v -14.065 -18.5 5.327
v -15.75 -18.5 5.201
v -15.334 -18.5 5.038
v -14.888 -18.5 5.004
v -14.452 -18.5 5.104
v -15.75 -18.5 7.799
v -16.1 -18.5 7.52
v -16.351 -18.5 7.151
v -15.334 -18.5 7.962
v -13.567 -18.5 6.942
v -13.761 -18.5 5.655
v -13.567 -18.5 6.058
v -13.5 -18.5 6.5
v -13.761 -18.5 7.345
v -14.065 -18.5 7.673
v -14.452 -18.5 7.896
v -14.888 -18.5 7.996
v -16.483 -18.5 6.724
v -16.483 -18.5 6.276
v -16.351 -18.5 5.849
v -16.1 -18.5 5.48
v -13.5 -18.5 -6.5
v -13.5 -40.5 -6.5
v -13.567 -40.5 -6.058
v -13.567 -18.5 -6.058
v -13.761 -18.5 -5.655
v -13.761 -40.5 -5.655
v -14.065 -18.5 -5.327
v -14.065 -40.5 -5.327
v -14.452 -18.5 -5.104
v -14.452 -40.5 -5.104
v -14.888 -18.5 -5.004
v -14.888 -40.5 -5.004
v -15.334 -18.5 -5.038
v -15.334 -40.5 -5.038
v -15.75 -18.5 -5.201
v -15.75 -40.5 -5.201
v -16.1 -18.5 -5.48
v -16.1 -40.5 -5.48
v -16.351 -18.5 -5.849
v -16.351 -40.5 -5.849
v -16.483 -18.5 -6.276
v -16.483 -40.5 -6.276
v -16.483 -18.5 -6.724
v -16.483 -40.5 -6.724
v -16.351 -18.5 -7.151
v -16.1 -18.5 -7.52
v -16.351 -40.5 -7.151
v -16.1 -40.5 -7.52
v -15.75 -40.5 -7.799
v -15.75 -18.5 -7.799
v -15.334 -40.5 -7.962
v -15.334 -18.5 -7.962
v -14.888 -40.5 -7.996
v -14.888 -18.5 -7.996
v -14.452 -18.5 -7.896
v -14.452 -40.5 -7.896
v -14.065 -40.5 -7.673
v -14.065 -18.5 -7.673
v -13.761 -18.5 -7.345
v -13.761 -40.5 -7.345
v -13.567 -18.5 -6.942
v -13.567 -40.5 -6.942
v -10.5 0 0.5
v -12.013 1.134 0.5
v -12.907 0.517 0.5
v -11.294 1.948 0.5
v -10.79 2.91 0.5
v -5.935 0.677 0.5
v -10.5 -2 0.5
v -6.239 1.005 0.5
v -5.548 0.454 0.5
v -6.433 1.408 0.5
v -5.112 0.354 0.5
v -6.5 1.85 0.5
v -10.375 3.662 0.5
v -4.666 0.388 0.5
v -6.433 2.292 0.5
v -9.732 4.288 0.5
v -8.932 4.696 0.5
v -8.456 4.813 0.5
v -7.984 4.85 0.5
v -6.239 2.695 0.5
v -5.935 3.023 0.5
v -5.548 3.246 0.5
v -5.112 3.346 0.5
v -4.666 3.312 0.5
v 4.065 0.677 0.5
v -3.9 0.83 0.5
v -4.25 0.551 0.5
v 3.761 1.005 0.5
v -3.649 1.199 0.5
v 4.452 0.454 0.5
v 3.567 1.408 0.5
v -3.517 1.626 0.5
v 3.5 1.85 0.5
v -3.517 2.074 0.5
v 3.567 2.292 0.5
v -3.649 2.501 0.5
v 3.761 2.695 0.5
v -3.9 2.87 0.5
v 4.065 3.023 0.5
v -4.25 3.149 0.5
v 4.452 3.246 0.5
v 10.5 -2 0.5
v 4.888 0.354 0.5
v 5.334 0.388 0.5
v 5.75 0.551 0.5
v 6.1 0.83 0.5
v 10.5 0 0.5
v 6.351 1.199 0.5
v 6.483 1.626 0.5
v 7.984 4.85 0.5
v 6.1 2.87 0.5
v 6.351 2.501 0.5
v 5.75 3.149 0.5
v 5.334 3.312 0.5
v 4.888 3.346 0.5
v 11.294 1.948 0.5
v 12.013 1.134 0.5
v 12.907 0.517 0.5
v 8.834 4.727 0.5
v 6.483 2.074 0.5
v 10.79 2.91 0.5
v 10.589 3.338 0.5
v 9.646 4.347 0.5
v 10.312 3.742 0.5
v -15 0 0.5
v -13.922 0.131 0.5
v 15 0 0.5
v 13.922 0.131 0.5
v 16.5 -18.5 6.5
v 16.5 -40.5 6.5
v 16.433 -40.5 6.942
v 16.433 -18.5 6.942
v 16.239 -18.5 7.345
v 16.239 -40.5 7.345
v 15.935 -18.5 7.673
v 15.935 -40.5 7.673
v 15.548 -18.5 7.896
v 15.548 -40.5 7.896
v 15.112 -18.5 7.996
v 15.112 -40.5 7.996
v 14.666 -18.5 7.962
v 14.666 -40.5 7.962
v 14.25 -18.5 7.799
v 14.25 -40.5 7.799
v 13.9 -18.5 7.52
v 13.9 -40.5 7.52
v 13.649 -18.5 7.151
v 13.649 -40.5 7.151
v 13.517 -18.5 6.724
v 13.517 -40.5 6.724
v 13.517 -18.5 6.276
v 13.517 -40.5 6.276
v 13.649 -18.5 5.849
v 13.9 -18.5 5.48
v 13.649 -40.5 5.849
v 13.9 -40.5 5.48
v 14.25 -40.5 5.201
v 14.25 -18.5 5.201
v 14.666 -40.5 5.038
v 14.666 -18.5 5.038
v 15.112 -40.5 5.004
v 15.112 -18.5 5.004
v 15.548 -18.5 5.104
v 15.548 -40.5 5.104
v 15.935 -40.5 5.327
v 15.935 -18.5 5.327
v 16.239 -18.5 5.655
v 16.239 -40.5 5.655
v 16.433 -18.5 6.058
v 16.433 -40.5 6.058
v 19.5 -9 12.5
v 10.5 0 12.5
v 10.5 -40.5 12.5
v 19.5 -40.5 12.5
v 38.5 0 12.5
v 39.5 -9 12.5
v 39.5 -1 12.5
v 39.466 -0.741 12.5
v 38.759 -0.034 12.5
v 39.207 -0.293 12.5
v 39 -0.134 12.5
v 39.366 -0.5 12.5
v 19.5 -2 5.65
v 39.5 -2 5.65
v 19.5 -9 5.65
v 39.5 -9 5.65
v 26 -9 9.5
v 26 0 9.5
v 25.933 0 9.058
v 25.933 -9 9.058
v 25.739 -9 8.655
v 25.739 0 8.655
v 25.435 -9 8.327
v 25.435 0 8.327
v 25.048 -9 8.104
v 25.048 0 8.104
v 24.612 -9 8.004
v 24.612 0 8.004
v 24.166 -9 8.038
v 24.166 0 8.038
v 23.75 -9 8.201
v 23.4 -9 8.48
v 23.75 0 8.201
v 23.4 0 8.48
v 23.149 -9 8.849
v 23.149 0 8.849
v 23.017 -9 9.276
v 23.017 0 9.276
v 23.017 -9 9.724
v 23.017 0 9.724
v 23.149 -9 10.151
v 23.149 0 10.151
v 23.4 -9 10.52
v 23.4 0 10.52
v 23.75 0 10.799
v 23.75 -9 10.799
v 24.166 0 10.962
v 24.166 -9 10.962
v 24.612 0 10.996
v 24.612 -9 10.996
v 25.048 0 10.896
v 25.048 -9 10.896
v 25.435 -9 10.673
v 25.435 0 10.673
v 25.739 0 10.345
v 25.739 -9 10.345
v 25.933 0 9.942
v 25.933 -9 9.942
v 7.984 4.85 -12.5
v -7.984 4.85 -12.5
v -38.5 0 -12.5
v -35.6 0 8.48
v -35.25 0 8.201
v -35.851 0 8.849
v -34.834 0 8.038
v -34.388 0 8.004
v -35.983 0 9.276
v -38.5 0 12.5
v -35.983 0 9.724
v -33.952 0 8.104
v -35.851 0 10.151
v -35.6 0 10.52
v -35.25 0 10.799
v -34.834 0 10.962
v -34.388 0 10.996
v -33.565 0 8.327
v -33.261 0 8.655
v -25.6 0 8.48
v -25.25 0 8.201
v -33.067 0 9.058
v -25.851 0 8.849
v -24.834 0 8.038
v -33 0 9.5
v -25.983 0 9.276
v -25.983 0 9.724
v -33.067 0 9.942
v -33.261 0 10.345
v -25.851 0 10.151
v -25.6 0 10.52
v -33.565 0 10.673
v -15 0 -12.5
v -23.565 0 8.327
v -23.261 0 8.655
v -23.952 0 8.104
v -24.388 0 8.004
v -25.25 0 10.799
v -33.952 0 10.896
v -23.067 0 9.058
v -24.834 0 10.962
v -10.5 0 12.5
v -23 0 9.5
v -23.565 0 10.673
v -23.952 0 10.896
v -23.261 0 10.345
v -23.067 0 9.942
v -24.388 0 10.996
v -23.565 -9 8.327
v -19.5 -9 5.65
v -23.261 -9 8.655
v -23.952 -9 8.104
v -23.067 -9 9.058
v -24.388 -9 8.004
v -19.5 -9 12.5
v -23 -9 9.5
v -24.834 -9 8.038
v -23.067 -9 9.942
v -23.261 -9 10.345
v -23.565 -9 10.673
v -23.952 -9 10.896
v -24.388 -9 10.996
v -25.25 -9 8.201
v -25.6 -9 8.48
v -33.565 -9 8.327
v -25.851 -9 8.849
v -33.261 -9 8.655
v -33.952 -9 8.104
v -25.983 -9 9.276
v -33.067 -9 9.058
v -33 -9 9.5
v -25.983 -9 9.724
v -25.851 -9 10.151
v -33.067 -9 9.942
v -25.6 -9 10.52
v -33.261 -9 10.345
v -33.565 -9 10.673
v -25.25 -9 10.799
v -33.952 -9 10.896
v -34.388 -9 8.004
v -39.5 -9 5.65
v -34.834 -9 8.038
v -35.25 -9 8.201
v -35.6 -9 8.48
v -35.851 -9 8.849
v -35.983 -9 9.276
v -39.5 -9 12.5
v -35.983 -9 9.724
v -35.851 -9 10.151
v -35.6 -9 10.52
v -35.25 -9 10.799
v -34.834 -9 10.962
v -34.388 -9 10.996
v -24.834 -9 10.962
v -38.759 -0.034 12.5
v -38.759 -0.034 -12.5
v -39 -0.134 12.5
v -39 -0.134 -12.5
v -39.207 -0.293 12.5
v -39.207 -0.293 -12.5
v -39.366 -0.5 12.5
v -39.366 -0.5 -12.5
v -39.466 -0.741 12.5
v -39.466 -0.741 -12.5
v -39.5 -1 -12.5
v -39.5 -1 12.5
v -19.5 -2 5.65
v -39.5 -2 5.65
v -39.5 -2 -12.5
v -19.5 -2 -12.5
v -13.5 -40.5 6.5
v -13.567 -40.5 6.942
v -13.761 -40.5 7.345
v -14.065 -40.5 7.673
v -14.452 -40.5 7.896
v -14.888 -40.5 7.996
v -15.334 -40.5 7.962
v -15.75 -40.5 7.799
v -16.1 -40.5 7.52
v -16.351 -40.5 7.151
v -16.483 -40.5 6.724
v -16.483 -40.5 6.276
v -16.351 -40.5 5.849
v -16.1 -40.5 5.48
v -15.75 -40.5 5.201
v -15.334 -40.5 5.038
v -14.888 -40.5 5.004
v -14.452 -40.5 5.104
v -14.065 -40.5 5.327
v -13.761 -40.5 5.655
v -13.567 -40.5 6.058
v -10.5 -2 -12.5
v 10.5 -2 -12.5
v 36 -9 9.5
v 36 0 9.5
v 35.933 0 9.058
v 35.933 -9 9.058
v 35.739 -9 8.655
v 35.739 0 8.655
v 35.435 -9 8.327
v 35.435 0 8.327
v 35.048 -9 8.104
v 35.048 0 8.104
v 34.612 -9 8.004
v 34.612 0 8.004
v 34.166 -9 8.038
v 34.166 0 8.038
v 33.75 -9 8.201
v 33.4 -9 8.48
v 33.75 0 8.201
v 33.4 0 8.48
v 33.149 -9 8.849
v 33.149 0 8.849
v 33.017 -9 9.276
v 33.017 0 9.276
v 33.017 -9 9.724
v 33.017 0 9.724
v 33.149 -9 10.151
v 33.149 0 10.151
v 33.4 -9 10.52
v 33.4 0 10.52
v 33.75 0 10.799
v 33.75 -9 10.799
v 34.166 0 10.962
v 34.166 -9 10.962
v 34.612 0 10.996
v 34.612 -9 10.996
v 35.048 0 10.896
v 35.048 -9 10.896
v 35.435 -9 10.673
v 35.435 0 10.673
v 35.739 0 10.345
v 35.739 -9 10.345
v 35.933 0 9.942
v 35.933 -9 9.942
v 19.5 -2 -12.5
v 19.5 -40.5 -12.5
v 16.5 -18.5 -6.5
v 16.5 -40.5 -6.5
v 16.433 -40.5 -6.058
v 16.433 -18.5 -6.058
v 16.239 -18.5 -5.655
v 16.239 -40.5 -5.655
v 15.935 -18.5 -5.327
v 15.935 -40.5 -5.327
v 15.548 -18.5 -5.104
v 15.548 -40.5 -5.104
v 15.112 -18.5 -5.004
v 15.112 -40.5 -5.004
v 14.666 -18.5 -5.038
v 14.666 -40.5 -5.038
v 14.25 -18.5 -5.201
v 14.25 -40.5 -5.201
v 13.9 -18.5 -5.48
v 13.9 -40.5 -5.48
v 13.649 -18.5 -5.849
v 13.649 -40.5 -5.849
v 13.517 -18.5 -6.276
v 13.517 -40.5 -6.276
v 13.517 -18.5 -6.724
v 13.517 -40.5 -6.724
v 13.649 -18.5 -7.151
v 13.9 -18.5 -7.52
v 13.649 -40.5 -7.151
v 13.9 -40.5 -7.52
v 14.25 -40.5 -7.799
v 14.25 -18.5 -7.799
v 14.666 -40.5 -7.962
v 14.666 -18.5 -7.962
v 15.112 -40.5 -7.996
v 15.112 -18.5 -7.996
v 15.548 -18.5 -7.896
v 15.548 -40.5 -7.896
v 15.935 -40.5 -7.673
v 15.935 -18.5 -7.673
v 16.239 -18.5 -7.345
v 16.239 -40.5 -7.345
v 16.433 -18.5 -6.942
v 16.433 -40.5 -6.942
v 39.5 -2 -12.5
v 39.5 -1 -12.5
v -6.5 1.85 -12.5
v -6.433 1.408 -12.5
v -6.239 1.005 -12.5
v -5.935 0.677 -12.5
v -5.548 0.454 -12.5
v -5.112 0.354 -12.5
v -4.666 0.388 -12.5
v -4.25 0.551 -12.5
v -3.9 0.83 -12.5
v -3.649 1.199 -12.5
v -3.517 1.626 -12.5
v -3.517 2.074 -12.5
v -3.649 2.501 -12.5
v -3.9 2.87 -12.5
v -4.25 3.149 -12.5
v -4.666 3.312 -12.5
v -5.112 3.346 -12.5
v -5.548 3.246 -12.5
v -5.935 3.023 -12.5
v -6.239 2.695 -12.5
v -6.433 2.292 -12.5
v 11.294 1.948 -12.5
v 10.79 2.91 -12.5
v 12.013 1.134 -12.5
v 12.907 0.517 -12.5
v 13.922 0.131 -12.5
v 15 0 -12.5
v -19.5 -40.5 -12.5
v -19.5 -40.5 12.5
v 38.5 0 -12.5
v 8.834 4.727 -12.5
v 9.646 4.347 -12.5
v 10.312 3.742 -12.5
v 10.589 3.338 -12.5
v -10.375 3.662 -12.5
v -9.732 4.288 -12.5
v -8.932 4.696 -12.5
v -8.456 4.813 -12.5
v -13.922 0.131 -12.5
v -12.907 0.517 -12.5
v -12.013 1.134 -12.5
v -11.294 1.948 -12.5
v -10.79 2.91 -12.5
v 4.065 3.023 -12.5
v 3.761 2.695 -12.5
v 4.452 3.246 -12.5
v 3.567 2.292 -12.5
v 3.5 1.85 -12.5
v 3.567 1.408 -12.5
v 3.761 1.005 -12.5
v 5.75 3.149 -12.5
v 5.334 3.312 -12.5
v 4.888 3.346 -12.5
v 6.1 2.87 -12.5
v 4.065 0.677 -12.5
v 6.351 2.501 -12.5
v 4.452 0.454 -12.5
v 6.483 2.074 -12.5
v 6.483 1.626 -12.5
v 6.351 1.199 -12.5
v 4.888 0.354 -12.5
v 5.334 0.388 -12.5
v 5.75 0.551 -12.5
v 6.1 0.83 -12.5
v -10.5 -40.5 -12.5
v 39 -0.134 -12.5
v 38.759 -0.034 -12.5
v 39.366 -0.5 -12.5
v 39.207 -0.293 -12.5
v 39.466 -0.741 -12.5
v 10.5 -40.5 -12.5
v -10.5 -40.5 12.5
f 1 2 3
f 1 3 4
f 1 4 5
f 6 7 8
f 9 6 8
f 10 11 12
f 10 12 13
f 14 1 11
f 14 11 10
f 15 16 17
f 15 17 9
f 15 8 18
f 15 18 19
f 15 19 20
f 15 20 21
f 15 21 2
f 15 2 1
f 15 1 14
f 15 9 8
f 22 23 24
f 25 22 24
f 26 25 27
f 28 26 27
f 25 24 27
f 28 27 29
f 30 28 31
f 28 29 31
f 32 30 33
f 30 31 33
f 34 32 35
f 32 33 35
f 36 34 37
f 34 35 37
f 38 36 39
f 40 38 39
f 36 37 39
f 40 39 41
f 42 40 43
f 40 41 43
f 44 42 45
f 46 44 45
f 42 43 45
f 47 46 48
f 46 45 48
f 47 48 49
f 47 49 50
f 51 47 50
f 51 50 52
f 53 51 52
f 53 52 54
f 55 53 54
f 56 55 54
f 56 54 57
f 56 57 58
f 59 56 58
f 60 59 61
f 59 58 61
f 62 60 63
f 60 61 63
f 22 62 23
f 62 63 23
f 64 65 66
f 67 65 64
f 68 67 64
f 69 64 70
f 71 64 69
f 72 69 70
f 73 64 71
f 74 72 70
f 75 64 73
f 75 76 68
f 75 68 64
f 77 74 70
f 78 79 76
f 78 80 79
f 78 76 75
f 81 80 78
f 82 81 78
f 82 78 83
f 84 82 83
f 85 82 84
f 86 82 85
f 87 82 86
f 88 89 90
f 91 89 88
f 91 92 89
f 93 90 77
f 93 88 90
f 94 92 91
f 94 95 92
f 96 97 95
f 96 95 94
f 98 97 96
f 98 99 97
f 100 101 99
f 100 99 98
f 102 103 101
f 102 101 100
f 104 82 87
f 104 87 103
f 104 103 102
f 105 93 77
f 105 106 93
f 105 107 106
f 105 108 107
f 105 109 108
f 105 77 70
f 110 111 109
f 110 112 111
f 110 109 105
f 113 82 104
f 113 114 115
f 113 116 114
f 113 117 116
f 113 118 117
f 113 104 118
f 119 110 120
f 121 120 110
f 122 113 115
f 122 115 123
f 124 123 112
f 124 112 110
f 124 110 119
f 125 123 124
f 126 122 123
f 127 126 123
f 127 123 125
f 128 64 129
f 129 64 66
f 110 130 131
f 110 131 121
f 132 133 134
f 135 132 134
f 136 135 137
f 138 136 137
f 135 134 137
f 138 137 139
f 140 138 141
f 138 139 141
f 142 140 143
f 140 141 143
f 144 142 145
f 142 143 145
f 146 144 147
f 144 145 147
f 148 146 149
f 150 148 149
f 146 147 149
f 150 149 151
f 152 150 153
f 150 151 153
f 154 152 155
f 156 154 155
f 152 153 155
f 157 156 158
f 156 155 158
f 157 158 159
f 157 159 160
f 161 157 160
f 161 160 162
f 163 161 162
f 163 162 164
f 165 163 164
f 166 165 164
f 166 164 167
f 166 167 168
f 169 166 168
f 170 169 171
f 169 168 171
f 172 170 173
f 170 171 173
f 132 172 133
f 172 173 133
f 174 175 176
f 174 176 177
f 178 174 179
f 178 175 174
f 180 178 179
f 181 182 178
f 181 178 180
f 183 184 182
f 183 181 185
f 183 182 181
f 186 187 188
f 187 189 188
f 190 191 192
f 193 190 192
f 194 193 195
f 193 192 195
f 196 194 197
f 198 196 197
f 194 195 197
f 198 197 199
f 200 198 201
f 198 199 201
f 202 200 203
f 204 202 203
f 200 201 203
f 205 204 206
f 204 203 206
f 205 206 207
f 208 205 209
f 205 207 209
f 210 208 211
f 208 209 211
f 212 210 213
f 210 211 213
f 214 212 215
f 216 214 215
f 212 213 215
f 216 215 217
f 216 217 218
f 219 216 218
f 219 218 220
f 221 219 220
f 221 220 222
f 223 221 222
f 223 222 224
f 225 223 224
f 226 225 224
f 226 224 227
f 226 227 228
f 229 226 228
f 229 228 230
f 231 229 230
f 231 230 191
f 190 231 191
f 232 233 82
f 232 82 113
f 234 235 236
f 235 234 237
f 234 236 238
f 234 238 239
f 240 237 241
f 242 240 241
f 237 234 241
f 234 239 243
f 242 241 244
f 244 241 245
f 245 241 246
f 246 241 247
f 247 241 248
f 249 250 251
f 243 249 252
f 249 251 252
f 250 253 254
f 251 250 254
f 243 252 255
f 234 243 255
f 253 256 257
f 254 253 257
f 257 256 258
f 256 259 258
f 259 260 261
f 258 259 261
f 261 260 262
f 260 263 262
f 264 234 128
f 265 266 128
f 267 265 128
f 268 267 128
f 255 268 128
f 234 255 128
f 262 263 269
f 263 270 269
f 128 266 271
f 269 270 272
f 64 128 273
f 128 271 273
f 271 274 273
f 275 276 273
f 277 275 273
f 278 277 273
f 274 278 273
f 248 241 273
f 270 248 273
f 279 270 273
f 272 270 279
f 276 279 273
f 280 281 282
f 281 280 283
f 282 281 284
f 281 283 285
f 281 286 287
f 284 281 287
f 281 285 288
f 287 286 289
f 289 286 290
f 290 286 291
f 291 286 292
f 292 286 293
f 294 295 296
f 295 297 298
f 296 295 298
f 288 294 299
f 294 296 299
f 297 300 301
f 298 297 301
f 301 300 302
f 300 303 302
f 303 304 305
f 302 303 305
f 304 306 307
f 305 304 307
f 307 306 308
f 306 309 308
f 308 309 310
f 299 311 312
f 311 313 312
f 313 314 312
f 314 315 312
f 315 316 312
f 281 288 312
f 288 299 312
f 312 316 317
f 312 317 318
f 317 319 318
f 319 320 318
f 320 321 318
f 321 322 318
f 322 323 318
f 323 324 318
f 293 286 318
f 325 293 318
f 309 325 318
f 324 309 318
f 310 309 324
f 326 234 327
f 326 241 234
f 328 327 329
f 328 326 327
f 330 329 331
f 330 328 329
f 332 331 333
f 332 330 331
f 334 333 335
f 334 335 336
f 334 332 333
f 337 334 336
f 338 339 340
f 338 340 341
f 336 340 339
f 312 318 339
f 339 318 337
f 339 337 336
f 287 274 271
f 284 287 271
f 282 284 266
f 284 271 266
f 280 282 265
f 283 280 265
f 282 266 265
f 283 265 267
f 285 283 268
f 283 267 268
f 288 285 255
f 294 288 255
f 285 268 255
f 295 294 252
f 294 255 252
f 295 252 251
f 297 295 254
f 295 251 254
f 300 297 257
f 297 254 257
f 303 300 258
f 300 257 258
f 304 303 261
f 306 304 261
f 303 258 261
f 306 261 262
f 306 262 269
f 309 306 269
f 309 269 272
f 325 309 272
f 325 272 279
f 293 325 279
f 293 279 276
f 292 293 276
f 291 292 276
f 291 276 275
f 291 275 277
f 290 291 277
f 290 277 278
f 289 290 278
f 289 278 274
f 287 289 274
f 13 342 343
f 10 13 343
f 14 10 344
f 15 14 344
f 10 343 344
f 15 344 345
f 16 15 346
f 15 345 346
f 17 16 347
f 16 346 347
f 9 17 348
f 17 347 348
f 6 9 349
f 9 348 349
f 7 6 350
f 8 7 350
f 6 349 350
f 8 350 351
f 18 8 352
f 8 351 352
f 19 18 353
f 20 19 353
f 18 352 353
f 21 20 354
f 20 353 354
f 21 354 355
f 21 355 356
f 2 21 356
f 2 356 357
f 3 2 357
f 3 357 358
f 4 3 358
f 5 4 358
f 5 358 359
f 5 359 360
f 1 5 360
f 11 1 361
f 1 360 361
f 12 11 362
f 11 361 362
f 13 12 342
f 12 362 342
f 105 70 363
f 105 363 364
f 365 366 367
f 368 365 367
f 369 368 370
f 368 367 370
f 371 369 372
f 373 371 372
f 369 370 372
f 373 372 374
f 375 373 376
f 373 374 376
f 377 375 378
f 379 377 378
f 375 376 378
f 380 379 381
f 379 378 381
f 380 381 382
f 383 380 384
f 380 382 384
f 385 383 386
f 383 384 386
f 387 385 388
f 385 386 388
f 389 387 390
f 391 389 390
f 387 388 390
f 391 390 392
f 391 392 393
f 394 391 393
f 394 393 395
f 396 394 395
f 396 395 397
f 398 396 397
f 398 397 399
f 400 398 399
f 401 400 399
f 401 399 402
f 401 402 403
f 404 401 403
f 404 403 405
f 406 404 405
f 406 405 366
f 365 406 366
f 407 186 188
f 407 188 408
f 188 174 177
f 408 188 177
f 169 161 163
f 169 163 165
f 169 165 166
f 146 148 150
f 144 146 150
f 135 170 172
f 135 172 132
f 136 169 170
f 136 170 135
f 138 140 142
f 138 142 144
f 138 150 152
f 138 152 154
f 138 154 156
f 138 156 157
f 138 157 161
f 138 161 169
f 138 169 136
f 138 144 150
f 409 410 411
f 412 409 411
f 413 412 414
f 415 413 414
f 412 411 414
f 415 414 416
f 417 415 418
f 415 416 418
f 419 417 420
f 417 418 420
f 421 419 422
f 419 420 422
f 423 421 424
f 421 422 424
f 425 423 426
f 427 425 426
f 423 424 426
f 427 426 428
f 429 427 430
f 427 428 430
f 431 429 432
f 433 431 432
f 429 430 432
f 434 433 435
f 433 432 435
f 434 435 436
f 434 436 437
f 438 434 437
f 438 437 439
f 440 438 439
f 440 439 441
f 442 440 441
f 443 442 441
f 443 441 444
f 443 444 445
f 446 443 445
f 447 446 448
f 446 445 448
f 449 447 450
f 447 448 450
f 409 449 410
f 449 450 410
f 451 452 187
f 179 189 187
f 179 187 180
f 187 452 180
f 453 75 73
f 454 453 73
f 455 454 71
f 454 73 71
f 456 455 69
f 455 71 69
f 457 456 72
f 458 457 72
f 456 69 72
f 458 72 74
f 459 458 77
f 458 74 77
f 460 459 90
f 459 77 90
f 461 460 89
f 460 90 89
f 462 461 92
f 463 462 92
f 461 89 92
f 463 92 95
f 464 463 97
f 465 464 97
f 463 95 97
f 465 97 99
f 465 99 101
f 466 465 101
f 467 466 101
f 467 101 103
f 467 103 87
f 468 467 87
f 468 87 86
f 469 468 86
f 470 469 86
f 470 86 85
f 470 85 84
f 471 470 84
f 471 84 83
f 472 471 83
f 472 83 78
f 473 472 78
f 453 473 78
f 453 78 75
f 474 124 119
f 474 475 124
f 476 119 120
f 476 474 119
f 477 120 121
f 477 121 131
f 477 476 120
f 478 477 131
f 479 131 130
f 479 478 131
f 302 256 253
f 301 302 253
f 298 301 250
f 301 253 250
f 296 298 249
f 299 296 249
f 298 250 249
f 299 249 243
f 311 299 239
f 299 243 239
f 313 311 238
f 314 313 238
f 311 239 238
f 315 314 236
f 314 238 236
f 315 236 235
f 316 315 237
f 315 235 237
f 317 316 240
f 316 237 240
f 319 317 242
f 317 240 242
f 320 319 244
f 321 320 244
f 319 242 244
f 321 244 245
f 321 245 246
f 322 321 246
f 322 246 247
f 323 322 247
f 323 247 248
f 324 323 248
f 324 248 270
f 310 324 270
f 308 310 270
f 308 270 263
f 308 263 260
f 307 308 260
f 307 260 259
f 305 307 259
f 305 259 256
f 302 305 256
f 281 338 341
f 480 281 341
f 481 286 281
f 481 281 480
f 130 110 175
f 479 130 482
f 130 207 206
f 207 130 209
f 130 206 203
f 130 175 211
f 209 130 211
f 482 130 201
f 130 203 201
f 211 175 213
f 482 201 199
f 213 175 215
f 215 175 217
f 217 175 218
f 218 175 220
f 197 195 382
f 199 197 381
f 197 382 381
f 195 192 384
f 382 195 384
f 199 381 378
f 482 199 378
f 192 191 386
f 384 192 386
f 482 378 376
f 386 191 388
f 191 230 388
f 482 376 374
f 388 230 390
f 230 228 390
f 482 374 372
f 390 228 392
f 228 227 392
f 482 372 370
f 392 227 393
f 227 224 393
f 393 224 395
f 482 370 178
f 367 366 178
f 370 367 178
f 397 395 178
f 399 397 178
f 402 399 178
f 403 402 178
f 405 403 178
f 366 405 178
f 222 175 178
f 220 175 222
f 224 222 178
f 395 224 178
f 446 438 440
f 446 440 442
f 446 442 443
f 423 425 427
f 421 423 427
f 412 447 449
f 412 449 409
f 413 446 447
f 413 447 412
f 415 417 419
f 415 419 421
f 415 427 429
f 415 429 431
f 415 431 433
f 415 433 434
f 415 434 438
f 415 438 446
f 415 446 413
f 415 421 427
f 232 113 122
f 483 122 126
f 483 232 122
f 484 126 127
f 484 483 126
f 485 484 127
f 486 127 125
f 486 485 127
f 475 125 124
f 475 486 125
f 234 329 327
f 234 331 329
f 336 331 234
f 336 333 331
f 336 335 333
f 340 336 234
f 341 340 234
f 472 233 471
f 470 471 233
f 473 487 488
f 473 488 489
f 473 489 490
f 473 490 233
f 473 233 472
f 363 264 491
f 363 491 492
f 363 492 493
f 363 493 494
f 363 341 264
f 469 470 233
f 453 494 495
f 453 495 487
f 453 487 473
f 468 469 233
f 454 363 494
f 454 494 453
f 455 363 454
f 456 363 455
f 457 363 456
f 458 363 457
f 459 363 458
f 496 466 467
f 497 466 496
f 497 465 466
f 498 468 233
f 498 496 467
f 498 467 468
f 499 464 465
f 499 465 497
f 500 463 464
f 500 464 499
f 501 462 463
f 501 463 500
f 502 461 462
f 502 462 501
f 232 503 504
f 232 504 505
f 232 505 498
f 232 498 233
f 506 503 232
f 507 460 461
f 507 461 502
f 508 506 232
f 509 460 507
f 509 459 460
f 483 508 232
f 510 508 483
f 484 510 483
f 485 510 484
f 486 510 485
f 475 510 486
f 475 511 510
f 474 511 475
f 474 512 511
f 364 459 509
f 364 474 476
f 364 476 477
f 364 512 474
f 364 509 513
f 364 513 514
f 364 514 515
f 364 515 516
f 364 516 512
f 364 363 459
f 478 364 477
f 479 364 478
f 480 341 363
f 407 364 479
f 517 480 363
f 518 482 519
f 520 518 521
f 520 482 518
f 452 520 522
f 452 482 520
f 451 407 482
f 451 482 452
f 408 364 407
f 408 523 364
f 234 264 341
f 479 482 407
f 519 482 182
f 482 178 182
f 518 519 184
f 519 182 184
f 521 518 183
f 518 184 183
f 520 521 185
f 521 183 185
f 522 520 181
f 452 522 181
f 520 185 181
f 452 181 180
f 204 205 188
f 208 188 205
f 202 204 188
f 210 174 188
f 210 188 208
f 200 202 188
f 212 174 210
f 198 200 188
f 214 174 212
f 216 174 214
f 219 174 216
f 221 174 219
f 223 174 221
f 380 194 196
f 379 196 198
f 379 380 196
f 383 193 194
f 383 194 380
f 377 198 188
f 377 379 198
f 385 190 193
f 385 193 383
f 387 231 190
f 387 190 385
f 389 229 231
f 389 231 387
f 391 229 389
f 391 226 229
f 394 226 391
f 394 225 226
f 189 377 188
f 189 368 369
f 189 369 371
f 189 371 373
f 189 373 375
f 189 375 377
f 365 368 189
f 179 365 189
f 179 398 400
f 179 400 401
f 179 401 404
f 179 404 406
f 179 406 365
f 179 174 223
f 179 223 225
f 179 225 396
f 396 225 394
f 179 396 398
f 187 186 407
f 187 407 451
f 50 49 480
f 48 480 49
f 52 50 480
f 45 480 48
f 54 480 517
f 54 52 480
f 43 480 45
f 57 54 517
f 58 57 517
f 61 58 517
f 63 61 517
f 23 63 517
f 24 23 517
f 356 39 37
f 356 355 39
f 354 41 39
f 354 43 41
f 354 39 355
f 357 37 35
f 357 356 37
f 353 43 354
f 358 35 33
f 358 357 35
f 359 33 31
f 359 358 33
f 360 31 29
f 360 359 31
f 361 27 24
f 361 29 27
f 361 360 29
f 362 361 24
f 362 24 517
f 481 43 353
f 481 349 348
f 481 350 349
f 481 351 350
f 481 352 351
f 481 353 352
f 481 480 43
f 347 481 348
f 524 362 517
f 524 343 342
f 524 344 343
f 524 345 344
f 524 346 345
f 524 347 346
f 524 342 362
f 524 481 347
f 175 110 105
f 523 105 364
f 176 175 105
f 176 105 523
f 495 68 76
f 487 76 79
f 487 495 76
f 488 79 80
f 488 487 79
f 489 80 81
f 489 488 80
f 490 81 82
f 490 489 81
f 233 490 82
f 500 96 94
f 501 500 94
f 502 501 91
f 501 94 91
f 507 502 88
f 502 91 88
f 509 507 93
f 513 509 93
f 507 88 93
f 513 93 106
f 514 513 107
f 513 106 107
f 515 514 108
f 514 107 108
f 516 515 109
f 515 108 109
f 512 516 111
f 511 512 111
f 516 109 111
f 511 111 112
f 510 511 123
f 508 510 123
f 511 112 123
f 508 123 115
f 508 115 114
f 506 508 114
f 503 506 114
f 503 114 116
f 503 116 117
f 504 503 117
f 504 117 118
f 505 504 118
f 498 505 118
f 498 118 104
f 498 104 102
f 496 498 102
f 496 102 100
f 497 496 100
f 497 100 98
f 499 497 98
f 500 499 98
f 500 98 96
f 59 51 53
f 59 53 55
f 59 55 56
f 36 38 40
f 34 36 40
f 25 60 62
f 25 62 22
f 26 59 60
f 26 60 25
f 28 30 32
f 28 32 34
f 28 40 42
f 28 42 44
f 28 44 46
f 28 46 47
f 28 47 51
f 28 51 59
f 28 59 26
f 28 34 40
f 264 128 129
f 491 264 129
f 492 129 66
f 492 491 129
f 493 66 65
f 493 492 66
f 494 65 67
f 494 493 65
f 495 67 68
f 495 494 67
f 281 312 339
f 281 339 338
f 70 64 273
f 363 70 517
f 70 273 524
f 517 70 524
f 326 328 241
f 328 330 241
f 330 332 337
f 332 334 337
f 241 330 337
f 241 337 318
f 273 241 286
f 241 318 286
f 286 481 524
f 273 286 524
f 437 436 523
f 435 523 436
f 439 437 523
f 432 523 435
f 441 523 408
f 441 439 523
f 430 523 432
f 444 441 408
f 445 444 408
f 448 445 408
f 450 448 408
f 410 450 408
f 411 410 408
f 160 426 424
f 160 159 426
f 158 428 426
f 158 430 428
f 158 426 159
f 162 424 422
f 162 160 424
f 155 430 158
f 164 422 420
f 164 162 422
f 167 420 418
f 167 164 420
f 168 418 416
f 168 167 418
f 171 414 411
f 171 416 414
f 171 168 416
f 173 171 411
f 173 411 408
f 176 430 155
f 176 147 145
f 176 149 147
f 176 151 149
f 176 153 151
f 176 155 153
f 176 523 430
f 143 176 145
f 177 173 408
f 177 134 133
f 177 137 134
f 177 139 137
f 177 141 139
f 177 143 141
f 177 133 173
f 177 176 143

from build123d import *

# Parameters (mm, degrees)
SKETCH_W        = 79
SKETCH_H        = 25
PAD_DEPTH       = 2
SKETCH001_W     = 21
SKETCH001_H     = 25
PAD001_DEPTH    = 4.85
SKETCH002_R     = 1.5
POCKET_DEPTH    = 25.001
SKETCH003_W     = 21
SKETCH003_H     = 12
POCKET001_DEPTH = 10
PAD002_DEPTH    = 6.85
SKETCH005_W     = 9
SKETCH005_H     = 38.5
PAD003_DEPTH    = 18.15
SKETCH006_R     = 1.5
POCKET002_DEPTH = 10
SKETCH007_R     = 1.5
POCKET003_DEPTH = 22
FILLET_R        = 4.5
FILLET001_R     = 3
FILLET002_R     = 1


with BuildPart() as part:
    # Sketch → Pad (new body)
    with BuildSketch(Plane.XZ):
        Rectangle(SKETCH_W, SKETCH_H)
    extrude(amount=PAD_DEPTH)

    # Sketch001 (on Face5 of Pad) → Pad001 (join)
    with BuildSketch(Plane(origin=(0, 0, 0), x_dir=(1, 0, 0), z_dir=(0, 1, 0))):
        Rectangle(SKETCH001_W, SKETCH001_H)
    extrude(amount=PAD001_DEPTH)

    # Sketch002 (on Face5 of Pad001) → Pocket (cut, through all)
    with BuildSketch(Plane(origin=(0, 0, 12.5), x_dir=(-1, 0, 0), z_dir=(0, 0, 1))):
        with Locations((-5, -1.85)):
            Circle(SKETCH002_R)
        with Locations((5, -1.85)):
            Circle(SKETCH002_R)
    extrude(amount=-POCKET_DEPTH, mode=Mode.SUBTRACT)

    # Sketch003 (on Face11 of Pocket) → Pocket001 (cut)
    with BuildSketch(Plane(origin=(0, 4.85, 0), x_dir=(1, 0, 0), z_dir=(0, 1, 0))):
        with Locations((0, -6.5)):
            Rectangle(SKETCH003_W, SKETCH003_H)
    extrude(amount=-POCKET001_DEPTH, mode=Mode.SUBTRACT)

    # Sketch004 (on DatumPlane) → Pad002 (join)
    with BuildSketch(Plane(origin=(0, -12.5, 12.5), x_dir=(-1, 0, 0), z_dir=(0, 0, 1))):
        Polygon((39.5, -10.5), (10.5, -10.5), (10.5, 28), (19.5, 28), (19.5, -3.5), (39.5, -3.5), align=None)
        Polygon((-10.5, -10.5), (-10.5, 28), (-19.5, 28), (-19.5, -3.5), (-39.5, -3.5), (-39.5, -10.5), align=None)
    extrude(amount=-PAD002_DEPTH)

    # Sketch005 (on Face21 of Pad002) → Pad003 (join)
    with BuildSketch(Plane(origin=(0, 0, 5.65), x_dir=(1, 0, 0), z_dir=(0, 0, -1))):
        with Locations((-15, 21.25)):
            Rectangle(SKETCH005_W, SKETCH005_H)
        with Locations((15, 21.25)):
            Rectangle(SKETCH005_W, SKETCH005_H)
    extrude(amount=PAD003_DEPTH)

    # Sketch006 (on Face17 of Pad003) → Pocket002 (cut)
    with BuildSketch(Plane(origin=(0, 0, 0), x_dir=(1, 0, 0), z_dir=(0, 1, 0))):
        with Locations((-34.5, -9.5)):
            Circle(SKETCH006_R)
        with Locations((-24.5, -9.5)):
            Circle(SKETCH006_R)
        with Locations((24.5, -9.5)):
            Circle(SKETCH006_R)
        with Locations((34.5, -9.5)):
            Circle(SKETCH006_R)
    extrude(amount=-POCKET002_DEPTH, mode=Mode.SUBTRACT)

    # Sketch007 (on Face26 of Pocket002) → Pocket003 (cut)
    with BuildSketch(Plane.XZ.offset(40.5)):
        with Locations((-15, 6.5)):
            Circle(SKETCH007_R)
        with Locations((-15, -6.5)):
            Circle(SKETCH007_R)
        with Locations((15, 6.5)):
            Circle(SKETCH007_R)
        with Locations((15, -6.5)):
            Circle(SKETCH007_R)
    extrude(amount=-POCKET003_DEPTH, mode=Mode.SUBTRACT)

    # Fillet
    fillet_edges = [part.edges().sort_by_distance(p)[0] for p in [
        (10.5, 0, -6),
        (-10.5, 0, -6),
    ]]
    fillet(fillet_edges, radius=FILLET_R)

    # Fillet001
    fillet001_edges = [part.edges().sort_by_distance(p)[0] for p in [
        (10.5, 4.85, -6),
        (-10.5, 4.85, -6),
    ]]
    fillet(fillet001_edges, radius=FILLET001_R)

    # Fillet002
    fillet002_edges = [part.edges().sort_by_distance(p)[0] for p in [
        (39.5, 0, 0),
        (-39.5, 0, 0),
    ]]
    fillet(fillet002_edges, radius=FILLET002_R)


solid = part.part
